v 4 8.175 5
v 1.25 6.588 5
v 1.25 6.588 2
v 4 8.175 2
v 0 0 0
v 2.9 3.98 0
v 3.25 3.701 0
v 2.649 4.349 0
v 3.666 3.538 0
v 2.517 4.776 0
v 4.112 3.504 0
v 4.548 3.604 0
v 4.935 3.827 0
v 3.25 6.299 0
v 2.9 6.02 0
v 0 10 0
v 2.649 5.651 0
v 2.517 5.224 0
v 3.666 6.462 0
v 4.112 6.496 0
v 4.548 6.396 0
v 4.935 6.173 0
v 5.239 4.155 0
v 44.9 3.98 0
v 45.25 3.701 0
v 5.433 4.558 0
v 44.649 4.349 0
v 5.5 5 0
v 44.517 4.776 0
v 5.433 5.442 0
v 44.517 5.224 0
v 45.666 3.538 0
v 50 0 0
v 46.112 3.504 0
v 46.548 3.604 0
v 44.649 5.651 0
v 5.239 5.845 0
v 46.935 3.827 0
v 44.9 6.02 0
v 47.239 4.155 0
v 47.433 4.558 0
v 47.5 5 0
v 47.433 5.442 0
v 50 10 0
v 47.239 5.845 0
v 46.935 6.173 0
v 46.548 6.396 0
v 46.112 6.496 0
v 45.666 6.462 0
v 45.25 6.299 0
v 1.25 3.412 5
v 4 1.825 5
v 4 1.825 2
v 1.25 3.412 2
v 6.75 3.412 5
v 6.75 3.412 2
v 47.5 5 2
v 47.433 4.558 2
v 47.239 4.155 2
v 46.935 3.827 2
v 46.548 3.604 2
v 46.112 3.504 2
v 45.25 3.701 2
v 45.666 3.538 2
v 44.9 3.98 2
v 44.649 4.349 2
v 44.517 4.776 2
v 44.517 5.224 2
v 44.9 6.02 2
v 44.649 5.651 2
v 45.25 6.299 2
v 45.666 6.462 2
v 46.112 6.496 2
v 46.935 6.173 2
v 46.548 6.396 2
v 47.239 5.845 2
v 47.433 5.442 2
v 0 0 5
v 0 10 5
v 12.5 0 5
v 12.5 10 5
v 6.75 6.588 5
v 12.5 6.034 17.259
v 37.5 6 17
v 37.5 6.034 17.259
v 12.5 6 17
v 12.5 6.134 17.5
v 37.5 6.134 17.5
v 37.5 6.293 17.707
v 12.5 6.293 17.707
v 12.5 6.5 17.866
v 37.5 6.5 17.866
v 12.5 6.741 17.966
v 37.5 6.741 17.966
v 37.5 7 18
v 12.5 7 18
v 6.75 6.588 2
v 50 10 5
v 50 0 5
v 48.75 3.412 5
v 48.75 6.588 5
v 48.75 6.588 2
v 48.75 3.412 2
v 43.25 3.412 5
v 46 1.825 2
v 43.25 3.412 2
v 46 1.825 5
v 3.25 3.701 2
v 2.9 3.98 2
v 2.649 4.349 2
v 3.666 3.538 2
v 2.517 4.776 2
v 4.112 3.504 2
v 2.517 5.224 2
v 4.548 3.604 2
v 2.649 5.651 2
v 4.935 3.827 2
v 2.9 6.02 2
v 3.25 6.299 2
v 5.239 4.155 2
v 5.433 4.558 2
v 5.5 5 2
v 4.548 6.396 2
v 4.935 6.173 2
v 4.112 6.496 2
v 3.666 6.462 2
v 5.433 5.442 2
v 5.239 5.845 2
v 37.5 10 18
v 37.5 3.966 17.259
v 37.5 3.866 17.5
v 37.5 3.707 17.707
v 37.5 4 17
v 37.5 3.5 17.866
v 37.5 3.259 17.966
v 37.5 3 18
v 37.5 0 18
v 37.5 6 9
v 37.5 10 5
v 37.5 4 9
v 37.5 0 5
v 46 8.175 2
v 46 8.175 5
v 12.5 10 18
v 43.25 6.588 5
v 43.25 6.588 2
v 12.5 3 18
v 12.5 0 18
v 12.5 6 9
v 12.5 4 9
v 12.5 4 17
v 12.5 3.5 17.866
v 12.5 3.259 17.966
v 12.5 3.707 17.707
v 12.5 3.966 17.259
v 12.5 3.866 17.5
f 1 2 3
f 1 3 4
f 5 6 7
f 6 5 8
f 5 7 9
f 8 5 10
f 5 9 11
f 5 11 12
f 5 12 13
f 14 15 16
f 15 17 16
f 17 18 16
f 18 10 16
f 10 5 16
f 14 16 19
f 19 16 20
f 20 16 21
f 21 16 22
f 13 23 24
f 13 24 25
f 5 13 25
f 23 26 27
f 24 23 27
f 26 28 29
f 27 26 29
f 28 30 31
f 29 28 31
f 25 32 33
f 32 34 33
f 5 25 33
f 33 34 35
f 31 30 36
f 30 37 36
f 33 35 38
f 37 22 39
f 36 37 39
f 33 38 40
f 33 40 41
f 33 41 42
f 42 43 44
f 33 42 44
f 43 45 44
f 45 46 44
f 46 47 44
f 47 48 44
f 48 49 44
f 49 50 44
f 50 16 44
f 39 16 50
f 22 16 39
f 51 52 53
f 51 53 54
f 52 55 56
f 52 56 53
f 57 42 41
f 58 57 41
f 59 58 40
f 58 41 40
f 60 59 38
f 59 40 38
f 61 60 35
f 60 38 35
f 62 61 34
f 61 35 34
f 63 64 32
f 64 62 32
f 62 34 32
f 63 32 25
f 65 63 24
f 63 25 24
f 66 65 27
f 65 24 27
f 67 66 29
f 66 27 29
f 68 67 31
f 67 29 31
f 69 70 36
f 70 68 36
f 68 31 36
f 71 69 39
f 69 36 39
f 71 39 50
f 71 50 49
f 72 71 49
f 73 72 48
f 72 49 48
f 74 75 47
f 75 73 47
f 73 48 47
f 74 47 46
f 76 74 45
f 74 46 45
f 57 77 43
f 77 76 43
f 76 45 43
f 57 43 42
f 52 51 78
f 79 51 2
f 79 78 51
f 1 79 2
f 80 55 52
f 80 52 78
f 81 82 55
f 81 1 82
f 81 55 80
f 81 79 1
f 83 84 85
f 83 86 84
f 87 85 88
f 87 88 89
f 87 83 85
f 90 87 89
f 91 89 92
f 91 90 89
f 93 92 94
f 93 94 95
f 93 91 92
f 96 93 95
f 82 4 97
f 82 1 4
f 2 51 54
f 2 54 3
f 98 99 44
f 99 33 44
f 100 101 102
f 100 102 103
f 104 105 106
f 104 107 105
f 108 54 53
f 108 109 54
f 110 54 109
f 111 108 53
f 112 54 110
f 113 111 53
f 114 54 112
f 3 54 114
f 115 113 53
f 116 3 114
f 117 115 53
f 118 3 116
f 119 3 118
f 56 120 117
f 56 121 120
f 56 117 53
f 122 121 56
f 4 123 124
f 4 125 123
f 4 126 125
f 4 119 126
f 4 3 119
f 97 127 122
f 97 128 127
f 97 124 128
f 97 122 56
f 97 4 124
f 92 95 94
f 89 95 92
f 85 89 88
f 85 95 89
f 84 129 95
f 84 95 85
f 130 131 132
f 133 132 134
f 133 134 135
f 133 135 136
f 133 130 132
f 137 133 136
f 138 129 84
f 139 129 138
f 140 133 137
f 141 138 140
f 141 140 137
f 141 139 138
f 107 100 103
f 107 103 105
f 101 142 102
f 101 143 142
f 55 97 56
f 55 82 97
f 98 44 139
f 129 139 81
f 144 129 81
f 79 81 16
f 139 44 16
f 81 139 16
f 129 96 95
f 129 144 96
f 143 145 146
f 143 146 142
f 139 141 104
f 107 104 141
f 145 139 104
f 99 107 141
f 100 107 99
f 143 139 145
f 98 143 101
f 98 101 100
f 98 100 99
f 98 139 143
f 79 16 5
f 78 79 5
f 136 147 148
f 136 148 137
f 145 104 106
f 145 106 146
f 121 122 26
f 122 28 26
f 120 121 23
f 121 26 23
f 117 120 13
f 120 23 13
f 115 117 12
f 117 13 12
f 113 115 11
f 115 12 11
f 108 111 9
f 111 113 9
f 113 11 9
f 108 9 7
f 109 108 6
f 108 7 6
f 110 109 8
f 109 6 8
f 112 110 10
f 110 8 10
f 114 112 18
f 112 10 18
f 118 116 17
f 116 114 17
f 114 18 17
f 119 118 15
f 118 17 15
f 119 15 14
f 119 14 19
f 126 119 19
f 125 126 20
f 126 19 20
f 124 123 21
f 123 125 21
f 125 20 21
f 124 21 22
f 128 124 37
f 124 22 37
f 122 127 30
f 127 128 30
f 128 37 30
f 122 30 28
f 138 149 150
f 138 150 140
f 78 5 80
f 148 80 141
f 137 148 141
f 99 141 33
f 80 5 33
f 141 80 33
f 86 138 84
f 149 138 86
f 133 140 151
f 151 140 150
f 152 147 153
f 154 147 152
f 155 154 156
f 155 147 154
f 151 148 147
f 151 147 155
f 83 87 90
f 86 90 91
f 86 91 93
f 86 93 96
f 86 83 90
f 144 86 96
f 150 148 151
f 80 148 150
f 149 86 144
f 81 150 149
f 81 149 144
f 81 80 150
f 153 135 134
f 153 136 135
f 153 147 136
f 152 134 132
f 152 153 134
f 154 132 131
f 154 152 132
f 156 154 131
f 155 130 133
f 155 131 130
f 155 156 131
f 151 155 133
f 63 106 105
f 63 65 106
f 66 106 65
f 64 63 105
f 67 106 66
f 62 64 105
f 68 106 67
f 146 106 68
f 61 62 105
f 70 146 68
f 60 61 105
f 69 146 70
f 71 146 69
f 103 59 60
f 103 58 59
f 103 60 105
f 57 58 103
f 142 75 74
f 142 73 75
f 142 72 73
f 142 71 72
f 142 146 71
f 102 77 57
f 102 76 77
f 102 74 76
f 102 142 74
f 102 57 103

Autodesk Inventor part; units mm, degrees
ref_plane "YZ Plane" through (0, 0, 0) normal (1, 0, 0) x (0, 1, 0)
ref_plane "XZ Plane" through (0, 0, 0) normal (0, 1, 0) x (-1, 0, 0)
ref_plane "XY Plane" through (0, 0, 0) normal (0, 0, 1) x (1, 0, 0)
sketch "Sketch1" plane through (0, 0, 0) normal (0, 0, 1) x (1, 0, 0)
  line L0 (0, 0) -> (50, 0)
  line L1 (50, 0) -> (50, 10)
  line L2 (50, 10) -> (0, 10)
  line L3 (0, 10) -> (0, 0)
  circle A0 centre (4, 5) radius 1.5
  circle A1 centre (46, 5) radius 1.5
  point P0 (0, 5)
  dimension "d0" = 50
  dimension "d1" = 10
  dimension "d22" = 3
  dimension "d23" = 3
  dimension "d24" = 4
  dimension "d25" = 4
extrude "Extrusion1" add sketch "Sketch1" along normal blind 5
sketch "Sketch2" plane through (0, 0, 5) normal (0, 0, 1) x (1, 0, 0)
  line L0 (50, 10) -> (0, 10) projected
  line L1 (0, 0) -> (50, 0) projected
  line L2 (12.5, 10) -> (37.5, 10)
  line L3 (37.5, 10) -> (37.5, 6)
  line L4 (37.5, 6) -> (12.5, 6)
  line L5 (12.5, 6) -> (12.5, 10)
  line L6 (12.5, 0) -> (37.5, 0)
  line L7 (37.5, 0) -> (37.5, 4)
  line L8 (37.5, 4) -> (12.5, 4)
  line L9 (12.5, 4) -> (12.5, 0)
  point P0 (25, 10)
  point P1 (25, 10)
  point P2 (25, 0)
  point P3 (25, 0)
  dimension "d14" = 25
  dimension "d15" = 25
  dimension "d31" = 2
  dimension "d32" = 4
  dimension "d33" = 4
extrude "Extrusion2" add sketch "Sketch2" along normal blind 13
fillet "Fillet1" radius 1 2 edges at (25, 6, 18) (25, 4, 18)
sketch "Sketch3" plane through (0, 0, 5) normal (0, 0, 1) x (1, 0, 0)
  circle A0 centre (4, 5) radius 1.5 projected
  circle A1 centre (46, 5) radius 1.5 projected
  line L0 (6.75, 6.5877) -> (6.75, 3.4123)
  line L1 (6.75, 3.4123) -> (4, 1.8246)
  line L2 (4, 1.8246) -> (1.25, 3.4123)
  line L3 (1.25, 3.4123) -> (1.25, 6.5877)
  line L4 (1.25, 6.5877) -> (4, 8.1754)
  line L5 (4, 8.1754) -> (6.75, 6.5877)
  line L6 (43.25, 6.5877) -> (46, 8.1754)
  line L7 (46, 8.1754) -> (48.75, 6.5877)
  line L8 (48.75, 6.5877) -> (48.75, 3.4123)
  line L9 (48.75, 3.4123) -> (46, 1.8246)
  line L10 (46, 1.8246) -> (43.25, 3.4123)
  line L11 (43.25, 3.4123) -> (43.25, 6.5877)
  point P0 (0, 0)
  dimension "d39" = 5.5
  dimension "d40" = 5.5
extrude "Extrusion3" cut sketch "Sketch3" against normal blind 3
sketch "Sketch4" plane through (0, 0, 5) normal (0, 0, 1) x (1, 0, 0)
  line L0 (12.5, 6) -> (12.5, 10) projected
  line L1 (37.5, 4) -> (37.5, 0) projected
  line L2 (12.5, 6) -> (37.5, 6)
  line L3 (37.5, 6) -> (37.5, 4)
  line L4 (37.5, 4) -> (12.5, 4)
  line L5 (12.5, 4) -> (12.5, 6)
  point P0 (0, 0)
extrude "Extrusion4" add sketch "Sketch4" along normal blind 4
equation "\"d15\" = d14"
equation "\"d32\" = d33"
equation "\"d40\" = d39"
properties part number "GT2 grip"
